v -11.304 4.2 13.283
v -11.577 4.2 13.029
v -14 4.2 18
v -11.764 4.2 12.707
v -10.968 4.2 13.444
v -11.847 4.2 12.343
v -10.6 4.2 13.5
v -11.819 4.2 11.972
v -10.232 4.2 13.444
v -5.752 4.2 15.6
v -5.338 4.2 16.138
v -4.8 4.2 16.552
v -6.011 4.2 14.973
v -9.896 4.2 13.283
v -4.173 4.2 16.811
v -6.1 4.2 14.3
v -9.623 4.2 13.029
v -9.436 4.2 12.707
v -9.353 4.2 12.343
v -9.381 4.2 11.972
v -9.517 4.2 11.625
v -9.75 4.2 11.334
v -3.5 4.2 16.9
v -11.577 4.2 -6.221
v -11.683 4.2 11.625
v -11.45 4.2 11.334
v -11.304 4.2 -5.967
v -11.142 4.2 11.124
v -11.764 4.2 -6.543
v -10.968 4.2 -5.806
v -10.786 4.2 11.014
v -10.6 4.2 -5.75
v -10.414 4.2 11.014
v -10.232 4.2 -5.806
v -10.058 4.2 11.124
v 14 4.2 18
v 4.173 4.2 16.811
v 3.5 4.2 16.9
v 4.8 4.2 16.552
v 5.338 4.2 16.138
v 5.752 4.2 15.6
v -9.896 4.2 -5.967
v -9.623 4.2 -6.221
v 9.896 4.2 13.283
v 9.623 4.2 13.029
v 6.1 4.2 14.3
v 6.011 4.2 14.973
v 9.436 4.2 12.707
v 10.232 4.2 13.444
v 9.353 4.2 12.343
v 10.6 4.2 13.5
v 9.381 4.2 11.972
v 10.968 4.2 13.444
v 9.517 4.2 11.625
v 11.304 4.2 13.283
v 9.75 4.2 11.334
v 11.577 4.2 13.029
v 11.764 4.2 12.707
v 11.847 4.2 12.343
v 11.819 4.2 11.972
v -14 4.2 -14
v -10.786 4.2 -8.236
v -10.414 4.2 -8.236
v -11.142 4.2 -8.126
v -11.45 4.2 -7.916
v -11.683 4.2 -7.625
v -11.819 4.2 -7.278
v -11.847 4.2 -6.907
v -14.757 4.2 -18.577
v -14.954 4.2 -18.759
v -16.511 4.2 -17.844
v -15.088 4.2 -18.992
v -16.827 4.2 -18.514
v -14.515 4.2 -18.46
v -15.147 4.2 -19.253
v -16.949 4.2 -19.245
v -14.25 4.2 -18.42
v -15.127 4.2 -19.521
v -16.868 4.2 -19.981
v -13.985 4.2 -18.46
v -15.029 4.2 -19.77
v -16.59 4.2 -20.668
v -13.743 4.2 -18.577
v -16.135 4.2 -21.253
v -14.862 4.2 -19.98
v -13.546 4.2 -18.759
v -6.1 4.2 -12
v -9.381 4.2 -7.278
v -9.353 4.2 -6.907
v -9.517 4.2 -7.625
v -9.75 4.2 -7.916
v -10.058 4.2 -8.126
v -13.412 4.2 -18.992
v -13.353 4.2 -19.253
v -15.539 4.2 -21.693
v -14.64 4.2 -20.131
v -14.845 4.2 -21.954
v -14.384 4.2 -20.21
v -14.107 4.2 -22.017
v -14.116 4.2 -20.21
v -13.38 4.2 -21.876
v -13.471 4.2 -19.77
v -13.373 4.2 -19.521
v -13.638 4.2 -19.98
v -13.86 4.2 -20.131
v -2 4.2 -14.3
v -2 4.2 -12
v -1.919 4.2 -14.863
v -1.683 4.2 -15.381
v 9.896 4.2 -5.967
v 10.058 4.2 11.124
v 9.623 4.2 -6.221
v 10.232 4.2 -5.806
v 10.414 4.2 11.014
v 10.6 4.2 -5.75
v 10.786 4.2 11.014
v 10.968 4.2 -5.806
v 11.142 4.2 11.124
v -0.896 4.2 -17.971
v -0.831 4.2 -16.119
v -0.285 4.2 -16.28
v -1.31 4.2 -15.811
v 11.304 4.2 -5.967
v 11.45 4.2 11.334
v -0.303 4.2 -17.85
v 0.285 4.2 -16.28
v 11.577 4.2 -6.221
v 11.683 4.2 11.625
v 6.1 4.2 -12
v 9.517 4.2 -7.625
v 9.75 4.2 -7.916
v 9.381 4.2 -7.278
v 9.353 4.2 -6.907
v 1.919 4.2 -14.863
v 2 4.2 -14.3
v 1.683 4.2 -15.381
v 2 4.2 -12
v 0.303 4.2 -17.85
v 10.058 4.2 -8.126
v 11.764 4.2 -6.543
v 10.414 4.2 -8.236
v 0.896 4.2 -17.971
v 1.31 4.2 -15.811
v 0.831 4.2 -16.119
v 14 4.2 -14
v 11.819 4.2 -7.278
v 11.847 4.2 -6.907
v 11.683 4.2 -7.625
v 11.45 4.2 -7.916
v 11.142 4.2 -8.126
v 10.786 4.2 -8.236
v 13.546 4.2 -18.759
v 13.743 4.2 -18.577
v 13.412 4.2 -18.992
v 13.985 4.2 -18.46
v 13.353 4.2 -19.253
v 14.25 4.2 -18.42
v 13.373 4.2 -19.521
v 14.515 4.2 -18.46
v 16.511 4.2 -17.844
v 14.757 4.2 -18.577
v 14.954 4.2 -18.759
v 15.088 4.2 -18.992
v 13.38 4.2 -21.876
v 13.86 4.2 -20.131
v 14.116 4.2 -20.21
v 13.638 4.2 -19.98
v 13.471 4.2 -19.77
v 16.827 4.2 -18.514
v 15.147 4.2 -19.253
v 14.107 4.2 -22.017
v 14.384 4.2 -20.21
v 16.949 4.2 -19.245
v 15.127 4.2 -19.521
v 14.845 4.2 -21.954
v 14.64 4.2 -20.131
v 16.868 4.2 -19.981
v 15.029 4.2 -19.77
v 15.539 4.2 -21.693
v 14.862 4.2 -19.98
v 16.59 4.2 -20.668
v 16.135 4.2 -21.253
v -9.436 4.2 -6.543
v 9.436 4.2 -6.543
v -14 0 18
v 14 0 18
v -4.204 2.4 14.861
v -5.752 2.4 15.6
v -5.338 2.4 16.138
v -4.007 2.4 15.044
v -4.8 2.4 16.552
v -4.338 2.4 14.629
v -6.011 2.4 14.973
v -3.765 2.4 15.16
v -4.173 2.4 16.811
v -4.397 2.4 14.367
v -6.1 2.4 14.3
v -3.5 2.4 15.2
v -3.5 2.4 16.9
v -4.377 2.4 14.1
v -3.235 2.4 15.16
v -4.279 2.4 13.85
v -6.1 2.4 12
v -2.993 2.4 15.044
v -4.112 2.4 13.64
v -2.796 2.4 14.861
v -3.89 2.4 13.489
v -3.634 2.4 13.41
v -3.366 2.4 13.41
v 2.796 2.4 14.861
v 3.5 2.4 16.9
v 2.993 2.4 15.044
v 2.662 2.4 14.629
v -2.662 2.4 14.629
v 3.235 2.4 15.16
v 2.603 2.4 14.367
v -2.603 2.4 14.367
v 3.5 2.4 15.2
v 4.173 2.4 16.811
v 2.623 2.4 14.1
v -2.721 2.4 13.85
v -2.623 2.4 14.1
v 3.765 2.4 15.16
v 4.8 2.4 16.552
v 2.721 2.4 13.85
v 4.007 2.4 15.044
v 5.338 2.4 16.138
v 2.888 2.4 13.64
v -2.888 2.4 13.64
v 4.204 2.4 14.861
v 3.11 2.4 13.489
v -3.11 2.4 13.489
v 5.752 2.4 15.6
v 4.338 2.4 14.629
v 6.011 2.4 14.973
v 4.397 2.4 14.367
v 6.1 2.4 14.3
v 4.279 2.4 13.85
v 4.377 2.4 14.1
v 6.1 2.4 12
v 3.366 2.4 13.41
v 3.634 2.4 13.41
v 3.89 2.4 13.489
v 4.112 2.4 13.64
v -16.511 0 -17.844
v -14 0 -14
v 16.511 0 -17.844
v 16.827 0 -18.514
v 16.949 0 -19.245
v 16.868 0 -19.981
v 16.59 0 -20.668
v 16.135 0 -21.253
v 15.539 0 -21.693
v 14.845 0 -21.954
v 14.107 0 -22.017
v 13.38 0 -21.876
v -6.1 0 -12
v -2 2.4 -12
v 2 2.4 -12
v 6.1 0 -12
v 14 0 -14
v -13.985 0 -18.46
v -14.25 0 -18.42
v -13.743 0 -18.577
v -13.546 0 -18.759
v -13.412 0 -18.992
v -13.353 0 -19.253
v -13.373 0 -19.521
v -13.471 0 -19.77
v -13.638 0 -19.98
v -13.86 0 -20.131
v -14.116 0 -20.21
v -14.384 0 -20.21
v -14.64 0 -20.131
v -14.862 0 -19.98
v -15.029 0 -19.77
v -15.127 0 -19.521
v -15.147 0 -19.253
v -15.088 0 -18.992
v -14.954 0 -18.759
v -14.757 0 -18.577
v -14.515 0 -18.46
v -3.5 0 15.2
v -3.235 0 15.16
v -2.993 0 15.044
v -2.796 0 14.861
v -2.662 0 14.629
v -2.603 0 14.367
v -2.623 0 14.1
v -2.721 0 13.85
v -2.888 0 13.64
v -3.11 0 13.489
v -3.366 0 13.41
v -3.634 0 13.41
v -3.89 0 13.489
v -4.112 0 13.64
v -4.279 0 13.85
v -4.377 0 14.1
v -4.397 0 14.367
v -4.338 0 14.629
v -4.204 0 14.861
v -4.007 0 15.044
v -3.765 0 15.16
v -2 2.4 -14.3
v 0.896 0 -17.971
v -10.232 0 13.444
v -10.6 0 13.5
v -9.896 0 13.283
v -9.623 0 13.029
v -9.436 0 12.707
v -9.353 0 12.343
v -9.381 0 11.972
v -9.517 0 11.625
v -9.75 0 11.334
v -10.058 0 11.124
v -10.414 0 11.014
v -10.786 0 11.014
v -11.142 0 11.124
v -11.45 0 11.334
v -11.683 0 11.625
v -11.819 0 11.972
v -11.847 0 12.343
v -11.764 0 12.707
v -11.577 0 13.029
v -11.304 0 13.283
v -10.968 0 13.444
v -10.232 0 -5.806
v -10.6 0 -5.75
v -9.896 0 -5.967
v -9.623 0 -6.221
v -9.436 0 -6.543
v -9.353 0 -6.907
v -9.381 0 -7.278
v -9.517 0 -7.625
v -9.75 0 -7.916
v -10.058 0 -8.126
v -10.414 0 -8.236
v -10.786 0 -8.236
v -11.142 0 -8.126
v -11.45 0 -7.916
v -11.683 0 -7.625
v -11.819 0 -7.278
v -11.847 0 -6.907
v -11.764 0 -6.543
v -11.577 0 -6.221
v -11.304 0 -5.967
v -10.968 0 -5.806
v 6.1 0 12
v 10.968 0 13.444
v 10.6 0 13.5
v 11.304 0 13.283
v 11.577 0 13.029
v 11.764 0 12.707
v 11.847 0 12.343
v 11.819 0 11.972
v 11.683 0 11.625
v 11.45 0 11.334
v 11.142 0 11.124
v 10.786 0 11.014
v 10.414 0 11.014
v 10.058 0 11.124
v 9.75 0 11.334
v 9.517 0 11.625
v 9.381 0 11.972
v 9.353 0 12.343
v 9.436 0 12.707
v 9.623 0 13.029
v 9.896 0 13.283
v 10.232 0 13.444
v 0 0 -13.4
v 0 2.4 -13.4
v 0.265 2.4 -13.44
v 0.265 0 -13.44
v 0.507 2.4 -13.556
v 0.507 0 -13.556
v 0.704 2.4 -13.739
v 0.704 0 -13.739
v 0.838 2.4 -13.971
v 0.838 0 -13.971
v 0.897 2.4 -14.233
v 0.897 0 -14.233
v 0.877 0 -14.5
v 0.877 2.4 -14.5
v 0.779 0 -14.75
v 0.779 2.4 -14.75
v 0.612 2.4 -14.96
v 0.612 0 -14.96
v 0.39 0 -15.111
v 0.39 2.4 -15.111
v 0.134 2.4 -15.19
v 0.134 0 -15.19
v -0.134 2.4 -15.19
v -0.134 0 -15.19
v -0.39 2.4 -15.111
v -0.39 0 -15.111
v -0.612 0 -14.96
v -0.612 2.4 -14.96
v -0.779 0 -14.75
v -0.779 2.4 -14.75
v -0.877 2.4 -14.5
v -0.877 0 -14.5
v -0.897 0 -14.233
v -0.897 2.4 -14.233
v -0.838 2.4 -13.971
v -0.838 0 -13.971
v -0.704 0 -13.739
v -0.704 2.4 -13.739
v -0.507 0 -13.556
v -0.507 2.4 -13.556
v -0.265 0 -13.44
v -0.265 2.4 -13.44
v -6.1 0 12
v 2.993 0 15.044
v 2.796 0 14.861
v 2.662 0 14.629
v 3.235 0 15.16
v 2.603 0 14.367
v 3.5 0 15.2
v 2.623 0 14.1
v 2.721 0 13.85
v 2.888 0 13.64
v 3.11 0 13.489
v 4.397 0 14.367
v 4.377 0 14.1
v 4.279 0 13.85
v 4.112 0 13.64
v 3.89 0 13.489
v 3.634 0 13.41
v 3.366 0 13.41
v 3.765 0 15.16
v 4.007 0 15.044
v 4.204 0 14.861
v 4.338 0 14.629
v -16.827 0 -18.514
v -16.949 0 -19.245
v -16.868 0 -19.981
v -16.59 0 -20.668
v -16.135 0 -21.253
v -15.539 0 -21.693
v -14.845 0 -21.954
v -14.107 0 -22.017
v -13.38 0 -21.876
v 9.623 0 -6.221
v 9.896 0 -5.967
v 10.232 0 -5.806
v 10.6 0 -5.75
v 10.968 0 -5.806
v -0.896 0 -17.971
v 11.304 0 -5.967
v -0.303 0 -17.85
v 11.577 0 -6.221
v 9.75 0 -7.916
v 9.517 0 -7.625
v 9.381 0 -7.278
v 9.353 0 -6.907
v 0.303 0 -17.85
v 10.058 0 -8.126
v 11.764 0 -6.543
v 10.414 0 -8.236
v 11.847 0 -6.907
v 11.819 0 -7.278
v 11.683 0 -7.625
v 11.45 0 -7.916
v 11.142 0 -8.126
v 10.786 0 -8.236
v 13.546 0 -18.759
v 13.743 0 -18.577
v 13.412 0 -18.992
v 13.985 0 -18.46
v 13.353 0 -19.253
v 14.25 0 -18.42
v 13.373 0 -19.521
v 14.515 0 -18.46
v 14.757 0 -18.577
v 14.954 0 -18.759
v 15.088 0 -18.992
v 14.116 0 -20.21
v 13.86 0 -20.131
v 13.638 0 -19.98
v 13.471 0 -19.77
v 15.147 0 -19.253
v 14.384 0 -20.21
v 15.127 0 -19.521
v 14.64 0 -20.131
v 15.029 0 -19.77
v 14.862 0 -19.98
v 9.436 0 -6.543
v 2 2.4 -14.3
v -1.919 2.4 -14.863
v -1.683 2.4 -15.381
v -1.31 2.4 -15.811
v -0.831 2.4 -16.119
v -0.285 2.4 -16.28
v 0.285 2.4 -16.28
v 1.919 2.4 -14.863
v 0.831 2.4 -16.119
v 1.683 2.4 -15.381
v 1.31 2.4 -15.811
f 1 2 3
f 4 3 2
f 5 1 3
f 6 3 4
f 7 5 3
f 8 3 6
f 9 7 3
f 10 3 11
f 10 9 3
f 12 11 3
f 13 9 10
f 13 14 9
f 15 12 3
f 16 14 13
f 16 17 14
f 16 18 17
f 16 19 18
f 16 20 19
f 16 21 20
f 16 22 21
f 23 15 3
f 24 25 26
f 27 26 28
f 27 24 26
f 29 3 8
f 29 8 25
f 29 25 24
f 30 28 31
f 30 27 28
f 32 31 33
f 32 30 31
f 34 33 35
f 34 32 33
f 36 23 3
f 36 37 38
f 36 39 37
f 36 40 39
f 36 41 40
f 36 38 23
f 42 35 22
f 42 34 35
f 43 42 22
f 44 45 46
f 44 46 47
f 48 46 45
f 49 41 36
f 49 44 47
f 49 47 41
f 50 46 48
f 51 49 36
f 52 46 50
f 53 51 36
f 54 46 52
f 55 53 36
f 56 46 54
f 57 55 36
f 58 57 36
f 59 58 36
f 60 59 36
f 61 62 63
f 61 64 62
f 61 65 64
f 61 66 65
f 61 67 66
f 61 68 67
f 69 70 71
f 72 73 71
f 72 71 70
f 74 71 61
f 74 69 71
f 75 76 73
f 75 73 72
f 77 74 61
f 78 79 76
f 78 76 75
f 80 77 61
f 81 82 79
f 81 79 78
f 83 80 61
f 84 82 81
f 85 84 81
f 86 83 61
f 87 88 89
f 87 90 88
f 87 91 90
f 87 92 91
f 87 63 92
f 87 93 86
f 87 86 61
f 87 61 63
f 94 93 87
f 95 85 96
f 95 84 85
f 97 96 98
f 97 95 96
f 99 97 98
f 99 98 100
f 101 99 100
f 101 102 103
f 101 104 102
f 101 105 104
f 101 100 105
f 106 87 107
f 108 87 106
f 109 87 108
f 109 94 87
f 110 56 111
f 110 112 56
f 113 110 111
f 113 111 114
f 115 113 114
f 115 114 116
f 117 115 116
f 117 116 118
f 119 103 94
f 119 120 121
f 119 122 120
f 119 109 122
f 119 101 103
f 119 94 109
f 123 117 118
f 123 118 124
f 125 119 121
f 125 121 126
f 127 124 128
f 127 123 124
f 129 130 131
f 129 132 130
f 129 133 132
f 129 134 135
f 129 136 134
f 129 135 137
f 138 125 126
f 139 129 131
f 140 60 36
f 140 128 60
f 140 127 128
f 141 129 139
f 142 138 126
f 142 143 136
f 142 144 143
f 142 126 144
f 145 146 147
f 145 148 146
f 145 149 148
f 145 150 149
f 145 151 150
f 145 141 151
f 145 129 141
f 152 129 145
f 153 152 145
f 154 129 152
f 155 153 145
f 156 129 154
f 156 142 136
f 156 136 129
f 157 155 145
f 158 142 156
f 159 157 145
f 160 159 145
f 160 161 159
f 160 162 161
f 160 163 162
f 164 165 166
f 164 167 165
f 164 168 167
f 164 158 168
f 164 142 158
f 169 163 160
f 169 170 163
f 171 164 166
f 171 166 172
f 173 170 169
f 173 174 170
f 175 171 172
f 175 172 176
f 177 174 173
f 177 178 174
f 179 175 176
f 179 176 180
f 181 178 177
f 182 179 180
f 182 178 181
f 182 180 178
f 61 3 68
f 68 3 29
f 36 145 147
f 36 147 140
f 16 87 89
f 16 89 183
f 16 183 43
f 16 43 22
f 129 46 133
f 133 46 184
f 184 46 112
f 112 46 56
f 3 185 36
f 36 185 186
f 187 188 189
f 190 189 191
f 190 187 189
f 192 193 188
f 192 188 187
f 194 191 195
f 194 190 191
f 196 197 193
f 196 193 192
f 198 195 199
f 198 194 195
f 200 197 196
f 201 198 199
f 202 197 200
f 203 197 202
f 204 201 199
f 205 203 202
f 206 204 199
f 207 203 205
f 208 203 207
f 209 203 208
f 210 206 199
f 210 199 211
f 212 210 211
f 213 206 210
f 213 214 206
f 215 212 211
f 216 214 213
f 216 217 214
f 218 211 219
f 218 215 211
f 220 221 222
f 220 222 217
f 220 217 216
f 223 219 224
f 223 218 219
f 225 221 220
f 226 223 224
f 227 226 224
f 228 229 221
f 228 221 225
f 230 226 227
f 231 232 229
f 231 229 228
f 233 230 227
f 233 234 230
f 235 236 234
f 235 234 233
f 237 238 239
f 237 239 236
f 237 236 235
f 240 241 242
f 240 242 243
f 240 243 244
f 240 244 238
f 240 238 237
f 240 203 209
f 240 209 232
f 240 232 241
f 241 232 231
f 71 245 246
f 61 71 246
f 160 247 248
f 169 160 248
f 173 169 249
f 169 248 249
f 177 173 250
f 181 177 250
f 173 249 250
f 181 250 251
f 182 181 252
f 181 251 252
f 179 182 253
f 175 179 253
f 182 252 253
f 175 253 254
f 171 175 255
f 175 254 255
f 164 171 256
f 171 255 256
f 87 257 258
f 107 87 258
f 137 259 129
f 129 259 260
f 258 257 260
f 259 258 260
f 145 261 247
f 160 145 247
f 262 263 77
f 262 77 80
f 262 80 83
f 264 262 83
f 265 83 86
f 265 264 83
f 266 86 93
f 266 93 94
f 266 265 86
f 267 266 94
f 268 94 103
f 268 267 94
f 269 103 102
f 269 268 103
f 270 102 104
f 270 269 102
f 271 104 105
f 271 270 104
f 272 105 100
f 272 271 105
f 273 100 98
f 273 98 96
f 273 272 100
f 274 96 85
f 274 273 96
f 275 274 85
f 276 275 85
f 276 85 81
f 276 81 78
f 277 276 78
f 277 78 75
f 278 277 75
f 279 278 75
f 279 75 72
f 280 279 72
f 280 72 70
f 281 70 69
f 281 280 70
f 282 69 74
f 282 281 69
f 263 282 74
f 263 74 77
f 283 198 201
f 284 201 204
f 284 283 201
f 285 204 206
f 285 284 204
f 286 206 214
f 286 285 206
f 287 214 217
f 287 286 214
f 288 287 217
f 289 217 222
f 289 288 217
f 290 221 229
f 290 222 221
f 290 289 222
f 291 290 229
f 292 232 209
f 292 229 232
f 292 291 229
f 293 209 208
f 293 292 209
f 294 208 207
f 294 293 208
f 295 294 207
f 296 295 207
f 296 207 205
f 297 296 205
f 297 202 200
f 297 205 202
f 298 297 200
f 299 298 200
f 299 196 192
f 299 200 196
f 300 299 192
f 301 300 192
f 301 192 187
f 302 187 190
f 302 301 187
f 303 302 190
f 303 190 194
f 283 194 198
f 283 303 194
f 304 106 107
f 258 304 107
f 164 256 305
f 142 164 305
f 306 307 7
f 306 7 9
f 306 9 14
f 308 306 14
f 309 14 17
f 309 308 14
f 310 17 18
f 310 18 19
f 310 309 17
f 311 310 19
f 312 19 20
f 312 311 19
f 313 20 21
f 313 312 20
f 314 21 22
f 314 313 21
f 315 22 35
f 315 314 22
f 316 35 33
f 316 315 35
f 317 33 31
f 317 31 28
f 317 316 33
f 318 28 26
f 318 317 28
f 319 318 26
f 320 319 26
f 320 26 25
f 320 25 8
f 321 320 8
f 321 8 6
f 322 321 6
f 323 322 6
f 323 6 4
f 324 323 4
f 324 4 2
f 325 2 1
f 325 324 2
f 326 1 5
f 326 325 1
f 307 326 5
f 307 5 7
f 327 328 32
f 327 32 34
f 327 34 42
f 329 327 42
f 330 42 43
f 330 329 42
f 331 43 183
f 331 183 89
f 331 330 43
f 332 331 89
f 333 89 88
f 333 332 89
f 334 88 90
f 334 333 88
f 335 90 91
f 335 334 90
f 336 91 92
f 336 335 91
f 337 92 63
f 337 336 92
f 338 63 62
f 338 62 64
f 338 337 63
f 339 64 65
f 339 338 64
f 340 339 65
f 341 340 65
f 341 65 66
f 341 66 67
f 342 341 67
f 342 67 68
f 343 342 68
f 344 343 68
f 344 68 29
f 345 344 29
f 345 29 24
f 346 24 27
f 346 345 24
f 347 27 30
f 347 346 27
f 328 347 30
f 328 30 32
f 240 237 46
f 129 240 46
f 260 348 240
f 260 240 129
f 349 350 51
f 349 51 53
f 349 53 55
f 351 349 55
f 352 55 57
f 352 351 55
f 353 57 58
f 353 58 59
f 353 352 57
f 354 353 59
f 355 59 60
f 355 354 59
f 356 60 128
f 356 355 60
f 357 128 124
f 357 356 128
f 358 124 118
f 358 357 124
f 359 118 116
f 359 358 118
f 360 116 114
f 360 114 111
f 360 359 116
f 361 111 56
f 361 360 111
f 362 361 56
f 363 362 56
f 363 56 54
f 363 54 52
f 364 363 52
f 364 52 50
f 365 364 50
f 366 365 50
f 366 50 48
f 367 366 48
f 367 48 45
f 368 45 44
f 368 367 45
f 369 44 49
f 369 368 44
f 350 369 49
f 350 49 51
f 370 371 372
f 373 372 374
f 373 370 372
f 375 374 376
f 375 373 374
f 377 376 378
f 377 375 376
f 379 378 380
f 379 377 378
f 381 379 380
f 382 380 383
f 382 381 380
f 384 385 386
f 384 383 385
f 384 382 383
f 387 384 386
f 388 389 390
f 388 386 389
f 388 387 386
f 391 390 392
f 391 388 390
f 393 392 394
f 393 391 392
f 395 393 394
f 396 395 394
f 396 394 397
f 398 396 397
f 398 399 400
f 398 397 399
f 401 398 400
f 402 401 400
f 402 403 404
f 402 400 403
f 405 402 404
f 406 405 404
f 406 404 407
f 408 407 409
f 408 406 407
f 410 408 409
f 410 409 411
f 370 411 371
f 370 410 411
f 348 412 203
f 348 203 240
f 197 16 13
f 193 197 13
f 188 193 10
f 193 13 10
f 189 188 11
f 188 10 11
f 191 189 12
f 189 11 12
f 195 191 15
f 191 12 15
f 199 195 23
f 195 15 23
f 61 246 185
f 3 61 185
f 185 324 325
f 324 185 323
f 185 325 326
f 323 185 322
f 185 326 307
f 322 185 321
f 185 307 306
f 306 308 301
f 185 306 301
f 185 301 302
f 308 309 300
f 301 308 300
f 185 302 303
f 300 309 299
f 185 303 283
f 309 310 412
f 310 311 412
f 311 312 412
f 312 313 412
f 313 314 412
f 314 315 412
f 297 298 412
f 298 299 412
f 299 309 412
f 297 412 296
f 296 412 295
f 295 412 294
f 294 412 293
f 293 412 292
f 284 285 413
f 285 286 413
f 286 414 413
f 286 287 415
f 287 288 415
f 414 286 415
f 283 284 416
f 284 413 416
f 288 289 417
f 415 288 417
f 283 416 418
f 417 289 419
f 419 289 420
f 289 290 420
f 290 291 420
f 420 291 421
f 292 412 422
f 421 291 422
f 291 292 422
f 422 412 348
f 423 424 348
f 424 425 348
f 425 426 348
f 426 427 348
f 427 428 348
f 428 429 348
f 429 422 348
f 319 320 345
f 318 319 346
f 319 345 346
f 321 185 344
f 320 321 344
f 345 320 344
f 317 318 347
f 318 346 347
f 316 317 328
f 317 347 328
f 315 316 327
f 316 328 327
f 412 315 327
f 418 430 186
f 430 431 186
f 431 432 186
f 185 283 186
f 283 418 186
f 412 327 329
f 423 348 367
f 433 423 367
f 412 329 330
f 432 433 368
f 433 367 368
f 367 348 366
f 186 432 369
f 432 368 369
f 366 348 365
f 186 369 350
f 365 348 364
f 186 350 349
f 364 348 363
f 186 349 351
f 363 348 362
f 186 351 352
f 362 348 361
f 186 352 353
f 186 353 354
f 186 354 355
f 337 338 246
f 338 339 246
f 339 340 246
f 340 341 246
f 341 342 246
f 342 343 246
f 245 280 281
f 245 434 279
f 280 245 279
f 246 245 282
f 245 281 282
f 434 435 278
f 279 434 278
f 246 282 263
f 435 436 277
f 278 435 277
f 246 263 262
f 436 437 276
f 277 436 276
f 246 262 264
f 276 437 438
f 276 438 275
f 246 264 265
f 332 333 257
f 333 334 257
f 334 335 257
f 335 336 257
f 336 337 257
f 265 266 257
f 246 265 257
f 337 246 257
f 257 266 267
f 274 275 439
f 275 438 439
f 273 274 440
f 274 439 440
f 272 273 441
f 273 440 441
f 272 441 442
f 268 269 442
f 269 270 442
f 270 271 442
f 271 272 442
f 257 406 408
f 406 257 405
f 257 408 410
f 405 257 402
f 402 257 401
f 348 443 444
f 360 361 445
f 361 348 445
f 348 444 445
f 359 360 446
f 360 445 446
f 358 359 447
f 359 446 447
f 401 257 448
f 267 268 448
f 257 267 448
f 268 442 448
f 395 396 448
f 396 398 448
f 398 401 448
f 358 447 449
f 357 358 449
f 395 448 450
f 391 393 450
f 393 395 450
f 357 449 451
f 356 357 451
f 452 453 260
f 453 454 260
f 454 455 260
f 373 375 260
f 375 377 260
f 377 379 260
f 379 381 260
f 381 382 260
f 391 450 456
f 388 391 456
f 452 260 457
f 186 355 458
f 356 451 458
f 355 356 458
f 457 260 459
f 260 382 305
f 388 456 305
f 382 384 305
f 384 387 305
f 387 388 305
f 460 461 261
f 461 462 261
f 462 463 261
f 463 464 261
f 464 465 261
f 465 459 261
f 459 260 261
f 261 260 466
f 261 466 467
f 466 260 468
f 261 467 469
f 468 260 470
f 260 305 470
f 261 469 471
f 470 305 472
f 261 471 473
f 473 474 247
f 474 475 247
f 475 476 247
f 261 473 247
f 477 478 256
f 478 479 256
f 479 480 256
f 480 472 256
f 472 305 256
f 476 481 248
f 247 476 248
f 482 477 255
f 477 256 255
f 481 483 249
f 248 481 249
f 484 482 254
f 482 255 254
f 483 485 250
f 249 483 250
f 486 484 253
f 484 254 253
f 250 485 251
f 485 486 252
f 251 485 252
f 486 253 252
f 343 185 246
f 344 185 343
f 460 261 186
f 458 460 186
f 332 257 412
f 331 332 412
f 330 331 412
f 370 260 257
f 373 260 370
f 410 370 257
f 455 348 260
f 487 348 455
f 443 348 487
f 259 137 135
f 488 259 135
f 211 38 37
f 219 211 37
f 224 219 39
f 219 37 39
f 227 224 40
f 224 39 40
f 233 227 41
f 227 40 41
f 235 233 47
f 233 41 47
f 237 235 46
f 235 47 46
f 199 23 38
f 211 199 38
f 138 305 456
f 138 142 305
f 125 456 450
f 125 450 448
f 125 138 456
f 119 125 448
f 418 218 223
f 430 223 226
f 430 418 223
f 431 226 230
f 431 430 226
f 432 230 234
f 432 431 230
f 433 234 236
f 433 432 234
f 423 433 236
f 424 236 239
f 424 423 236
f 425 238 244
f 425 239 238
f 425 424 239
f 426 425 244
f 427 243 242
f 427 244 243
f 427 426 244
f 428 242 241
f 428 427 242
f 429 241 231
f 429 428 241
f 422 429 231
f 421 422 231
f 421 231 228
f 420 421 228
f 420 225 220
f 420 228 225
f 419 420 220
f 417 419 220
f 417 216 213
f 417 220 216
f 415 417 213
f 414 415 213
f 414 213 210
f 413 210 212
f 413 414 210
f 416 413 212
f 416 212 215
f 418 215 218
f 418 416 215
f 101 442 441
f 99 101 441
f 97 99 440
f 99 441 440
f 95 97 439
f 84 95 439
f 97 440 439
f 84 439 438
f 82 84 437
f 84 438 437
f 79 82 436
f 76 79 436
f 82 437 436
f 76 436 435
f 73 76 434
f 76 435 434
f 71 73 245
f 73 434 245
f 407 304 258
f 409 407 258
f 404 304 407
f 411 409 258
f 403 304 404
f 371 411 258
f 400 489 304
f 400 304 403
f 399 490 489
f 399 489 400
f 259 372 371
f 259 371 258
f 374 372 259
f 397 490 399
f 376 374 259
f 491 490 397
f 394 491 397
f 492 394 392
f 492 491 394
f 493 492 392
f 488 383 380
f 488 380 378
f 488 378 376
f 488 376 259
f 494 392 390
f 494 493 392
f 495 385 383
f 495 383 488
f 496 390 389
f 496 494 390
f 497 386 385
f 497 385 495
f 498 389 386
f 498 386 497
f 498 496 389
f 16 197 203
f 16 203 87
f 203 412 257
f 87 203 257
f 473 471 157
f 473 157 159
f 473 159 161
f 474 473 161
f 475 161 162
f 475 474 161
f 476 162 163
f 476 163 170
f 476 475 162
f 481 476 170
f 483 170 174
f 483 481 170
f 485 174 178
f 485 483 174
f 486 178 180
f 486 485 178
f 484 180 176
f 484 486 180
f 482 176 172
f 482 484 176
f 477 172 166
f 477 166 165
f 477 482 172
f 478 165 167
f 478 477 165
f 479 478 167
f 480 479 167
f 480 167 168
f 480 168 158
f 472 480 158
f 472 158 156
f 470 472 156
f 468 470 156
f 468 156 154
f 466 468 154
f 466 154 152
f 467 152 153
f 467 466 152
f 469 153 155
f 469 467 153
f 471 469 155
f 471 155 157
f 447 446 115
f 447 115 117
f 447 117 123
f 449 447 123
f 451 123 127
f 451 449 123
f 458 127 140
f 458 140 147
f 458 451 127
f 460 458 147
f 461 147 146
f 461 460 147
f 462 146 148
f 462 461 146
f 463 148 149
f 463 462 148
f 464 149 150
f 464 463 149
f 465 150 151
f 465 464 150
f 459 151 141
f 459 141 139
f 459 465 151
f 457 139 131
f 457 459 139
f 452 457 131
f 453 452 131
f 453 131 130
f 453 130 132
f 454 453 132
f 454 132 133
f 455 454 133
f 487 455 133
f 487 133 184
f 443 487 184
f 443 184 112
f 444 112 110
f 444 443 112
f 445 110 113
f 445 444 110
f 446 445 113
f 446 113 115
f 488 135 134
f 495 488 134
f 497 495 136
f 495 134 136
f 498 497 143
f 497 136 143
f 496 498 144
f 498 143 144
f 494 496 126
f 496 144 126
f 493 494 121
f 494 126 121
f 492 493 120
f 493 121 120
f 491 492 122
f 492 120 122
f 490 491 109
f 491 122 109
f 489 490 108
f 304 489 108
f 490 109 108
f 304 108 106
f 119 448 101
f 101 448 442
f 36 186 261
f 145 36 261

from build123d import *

# Parameters (mm, degrees)
SKETCH1_R           = 1.25
SKETCH1_R_2         = 0.9
SKETCH1_W           = 12.2
SKETCH1_H           = 24
BOSS_EXTRUDE2_DEPTH = 4.2
FILLET1_R           = 3
CUT_EXTRUDE1_DEPTH  = 1.8


with BuildPart() as part:
    # Sketch1 → Boss-Extrude2 (new body)
    with BuildSketch(Plane(origin=(0, 0, 0), x_dir=(1, 0, 0), z_dir=(0, 1, 0))):
        with BuildLine():
            Line((14, -18), (14, 14))
            Line((14, 14), (16.51058682, 17.844088419))
            ThreePointArc((16.51058682, 17.844088419), (16.382617975, 20.976365727), (13.379699555, 21.876375797))
            Line((13.379699555, 21.876375797), (0, 17.690906278))
            Line((0, 17.690906278), (-13.379699555, 21.876375797))
            ThreePointArc((-13.379699555, 21.876375797), (-16.382617975, 20.976365727), (-16.51058682, 17.844088419))
            Line((-16.51058682, 17.844088419), (-14, 14))
            Line((-14, 14), (-14, -18))
            Line((-14, -18), (14, -18))
        make_face()
        with Locations(Location((-10.6, 7, 0), (0, 0, 270))):
            Circle(SKETCH1_R, mode=Mode.SUBTRACT)
        with Locations(Location((-10.6, -12.25, 0), (0, 0, 270))):
            Circle(SKETCH1_R, mode=Mode.SUBTRACT)
        with Locations(Location((-3.5, -14.3, 0), (0, 0, 270))):
            Circle(SKETCH1_R_2, mode=Mode.SUBTRACT)
        with Locations(Location((3.5, -14.3, 0), (0, 0, 270))):
            Circle(SKETCH1_R_2, mode=Mode.SUBTRACT)
        with Locations(Location((10.6, -12.25, 0), (0, 0, 270))):
            Circle(SKETCH1_R, mode=Mode.SUBTRACT)
        with Locations(Location((10.6, 7, 0), (0, 0, 270))):
            Circle(SKETCH1_R, mode=Mode.SUBTRACT)
        with Locations(Location((0, 14.3, 0), (0, 0, 270))):
            Circle(SKETCH1_R_2, mode=Mode.SUBTRACT)
        with Locations(Location((-14.25, 19.320485123, 0), (0, 0, 270))):
            Circle(SKETCH1_R_2, mode=Mode.SUBTRACT)
        with Locations(Location((14.25, 19.320485123, 0), (0, 0, 270))):
            Circle(SKETCH1_R_2, mode=Mode.SUBTRACT)
        Rectangle(SKETCH1_W, SKETCH1_H, mode=Mode.SUBTRACT)
    extrude(amount=BOSS_EXTRUDE2_DEPTH)

    # Fillet1
    fillet1_edges = [part.edges().sort_by_distance(p)[0] for p in [
        (0, 2.1, -17.690906278),
    ]]
    fillet(fillet1_edges, radius=FILLET1_R)

    # Sketch2 → Cut-Extrude1 (cut)
    with BuildSketch(Plane(origin=(0, 4.2, 0), x_dir=(1, 0, 0), z_dir=(0, 1, 0))):
        with BuildLine():
            Line((-6.1, -12), (-6.1, -14.3))
            ThreePointArc((-6.1, -14.3), (-5.338477631, -16.138477631), (-3.5, -16.9))
            Line((-3.5, -16.9), (3.5, -16.9))
            ThreePointArc((3.5, -16.9), (5.338477631, -16.138477631), (6.1, -14.3))
            Line((6.1, -14.3), (6.1, -12))
            Line((6.1, -12), (-6.1, -12))
        make_face()
        with BuildLine():
            Line((-2, 14.3), (-2, 12))
            Line((-2, 12), (2, 12))
            Line((2, 12), (2, 14.3))
            ThreePointArc((2, 14.3), (0, 16.3), (-2, 14.3))
        make_face()
    extrude(amount=-CUT_EXTRUDE1_DEPTH, mode=Mode.SUBTRACT)


solid = part.part
